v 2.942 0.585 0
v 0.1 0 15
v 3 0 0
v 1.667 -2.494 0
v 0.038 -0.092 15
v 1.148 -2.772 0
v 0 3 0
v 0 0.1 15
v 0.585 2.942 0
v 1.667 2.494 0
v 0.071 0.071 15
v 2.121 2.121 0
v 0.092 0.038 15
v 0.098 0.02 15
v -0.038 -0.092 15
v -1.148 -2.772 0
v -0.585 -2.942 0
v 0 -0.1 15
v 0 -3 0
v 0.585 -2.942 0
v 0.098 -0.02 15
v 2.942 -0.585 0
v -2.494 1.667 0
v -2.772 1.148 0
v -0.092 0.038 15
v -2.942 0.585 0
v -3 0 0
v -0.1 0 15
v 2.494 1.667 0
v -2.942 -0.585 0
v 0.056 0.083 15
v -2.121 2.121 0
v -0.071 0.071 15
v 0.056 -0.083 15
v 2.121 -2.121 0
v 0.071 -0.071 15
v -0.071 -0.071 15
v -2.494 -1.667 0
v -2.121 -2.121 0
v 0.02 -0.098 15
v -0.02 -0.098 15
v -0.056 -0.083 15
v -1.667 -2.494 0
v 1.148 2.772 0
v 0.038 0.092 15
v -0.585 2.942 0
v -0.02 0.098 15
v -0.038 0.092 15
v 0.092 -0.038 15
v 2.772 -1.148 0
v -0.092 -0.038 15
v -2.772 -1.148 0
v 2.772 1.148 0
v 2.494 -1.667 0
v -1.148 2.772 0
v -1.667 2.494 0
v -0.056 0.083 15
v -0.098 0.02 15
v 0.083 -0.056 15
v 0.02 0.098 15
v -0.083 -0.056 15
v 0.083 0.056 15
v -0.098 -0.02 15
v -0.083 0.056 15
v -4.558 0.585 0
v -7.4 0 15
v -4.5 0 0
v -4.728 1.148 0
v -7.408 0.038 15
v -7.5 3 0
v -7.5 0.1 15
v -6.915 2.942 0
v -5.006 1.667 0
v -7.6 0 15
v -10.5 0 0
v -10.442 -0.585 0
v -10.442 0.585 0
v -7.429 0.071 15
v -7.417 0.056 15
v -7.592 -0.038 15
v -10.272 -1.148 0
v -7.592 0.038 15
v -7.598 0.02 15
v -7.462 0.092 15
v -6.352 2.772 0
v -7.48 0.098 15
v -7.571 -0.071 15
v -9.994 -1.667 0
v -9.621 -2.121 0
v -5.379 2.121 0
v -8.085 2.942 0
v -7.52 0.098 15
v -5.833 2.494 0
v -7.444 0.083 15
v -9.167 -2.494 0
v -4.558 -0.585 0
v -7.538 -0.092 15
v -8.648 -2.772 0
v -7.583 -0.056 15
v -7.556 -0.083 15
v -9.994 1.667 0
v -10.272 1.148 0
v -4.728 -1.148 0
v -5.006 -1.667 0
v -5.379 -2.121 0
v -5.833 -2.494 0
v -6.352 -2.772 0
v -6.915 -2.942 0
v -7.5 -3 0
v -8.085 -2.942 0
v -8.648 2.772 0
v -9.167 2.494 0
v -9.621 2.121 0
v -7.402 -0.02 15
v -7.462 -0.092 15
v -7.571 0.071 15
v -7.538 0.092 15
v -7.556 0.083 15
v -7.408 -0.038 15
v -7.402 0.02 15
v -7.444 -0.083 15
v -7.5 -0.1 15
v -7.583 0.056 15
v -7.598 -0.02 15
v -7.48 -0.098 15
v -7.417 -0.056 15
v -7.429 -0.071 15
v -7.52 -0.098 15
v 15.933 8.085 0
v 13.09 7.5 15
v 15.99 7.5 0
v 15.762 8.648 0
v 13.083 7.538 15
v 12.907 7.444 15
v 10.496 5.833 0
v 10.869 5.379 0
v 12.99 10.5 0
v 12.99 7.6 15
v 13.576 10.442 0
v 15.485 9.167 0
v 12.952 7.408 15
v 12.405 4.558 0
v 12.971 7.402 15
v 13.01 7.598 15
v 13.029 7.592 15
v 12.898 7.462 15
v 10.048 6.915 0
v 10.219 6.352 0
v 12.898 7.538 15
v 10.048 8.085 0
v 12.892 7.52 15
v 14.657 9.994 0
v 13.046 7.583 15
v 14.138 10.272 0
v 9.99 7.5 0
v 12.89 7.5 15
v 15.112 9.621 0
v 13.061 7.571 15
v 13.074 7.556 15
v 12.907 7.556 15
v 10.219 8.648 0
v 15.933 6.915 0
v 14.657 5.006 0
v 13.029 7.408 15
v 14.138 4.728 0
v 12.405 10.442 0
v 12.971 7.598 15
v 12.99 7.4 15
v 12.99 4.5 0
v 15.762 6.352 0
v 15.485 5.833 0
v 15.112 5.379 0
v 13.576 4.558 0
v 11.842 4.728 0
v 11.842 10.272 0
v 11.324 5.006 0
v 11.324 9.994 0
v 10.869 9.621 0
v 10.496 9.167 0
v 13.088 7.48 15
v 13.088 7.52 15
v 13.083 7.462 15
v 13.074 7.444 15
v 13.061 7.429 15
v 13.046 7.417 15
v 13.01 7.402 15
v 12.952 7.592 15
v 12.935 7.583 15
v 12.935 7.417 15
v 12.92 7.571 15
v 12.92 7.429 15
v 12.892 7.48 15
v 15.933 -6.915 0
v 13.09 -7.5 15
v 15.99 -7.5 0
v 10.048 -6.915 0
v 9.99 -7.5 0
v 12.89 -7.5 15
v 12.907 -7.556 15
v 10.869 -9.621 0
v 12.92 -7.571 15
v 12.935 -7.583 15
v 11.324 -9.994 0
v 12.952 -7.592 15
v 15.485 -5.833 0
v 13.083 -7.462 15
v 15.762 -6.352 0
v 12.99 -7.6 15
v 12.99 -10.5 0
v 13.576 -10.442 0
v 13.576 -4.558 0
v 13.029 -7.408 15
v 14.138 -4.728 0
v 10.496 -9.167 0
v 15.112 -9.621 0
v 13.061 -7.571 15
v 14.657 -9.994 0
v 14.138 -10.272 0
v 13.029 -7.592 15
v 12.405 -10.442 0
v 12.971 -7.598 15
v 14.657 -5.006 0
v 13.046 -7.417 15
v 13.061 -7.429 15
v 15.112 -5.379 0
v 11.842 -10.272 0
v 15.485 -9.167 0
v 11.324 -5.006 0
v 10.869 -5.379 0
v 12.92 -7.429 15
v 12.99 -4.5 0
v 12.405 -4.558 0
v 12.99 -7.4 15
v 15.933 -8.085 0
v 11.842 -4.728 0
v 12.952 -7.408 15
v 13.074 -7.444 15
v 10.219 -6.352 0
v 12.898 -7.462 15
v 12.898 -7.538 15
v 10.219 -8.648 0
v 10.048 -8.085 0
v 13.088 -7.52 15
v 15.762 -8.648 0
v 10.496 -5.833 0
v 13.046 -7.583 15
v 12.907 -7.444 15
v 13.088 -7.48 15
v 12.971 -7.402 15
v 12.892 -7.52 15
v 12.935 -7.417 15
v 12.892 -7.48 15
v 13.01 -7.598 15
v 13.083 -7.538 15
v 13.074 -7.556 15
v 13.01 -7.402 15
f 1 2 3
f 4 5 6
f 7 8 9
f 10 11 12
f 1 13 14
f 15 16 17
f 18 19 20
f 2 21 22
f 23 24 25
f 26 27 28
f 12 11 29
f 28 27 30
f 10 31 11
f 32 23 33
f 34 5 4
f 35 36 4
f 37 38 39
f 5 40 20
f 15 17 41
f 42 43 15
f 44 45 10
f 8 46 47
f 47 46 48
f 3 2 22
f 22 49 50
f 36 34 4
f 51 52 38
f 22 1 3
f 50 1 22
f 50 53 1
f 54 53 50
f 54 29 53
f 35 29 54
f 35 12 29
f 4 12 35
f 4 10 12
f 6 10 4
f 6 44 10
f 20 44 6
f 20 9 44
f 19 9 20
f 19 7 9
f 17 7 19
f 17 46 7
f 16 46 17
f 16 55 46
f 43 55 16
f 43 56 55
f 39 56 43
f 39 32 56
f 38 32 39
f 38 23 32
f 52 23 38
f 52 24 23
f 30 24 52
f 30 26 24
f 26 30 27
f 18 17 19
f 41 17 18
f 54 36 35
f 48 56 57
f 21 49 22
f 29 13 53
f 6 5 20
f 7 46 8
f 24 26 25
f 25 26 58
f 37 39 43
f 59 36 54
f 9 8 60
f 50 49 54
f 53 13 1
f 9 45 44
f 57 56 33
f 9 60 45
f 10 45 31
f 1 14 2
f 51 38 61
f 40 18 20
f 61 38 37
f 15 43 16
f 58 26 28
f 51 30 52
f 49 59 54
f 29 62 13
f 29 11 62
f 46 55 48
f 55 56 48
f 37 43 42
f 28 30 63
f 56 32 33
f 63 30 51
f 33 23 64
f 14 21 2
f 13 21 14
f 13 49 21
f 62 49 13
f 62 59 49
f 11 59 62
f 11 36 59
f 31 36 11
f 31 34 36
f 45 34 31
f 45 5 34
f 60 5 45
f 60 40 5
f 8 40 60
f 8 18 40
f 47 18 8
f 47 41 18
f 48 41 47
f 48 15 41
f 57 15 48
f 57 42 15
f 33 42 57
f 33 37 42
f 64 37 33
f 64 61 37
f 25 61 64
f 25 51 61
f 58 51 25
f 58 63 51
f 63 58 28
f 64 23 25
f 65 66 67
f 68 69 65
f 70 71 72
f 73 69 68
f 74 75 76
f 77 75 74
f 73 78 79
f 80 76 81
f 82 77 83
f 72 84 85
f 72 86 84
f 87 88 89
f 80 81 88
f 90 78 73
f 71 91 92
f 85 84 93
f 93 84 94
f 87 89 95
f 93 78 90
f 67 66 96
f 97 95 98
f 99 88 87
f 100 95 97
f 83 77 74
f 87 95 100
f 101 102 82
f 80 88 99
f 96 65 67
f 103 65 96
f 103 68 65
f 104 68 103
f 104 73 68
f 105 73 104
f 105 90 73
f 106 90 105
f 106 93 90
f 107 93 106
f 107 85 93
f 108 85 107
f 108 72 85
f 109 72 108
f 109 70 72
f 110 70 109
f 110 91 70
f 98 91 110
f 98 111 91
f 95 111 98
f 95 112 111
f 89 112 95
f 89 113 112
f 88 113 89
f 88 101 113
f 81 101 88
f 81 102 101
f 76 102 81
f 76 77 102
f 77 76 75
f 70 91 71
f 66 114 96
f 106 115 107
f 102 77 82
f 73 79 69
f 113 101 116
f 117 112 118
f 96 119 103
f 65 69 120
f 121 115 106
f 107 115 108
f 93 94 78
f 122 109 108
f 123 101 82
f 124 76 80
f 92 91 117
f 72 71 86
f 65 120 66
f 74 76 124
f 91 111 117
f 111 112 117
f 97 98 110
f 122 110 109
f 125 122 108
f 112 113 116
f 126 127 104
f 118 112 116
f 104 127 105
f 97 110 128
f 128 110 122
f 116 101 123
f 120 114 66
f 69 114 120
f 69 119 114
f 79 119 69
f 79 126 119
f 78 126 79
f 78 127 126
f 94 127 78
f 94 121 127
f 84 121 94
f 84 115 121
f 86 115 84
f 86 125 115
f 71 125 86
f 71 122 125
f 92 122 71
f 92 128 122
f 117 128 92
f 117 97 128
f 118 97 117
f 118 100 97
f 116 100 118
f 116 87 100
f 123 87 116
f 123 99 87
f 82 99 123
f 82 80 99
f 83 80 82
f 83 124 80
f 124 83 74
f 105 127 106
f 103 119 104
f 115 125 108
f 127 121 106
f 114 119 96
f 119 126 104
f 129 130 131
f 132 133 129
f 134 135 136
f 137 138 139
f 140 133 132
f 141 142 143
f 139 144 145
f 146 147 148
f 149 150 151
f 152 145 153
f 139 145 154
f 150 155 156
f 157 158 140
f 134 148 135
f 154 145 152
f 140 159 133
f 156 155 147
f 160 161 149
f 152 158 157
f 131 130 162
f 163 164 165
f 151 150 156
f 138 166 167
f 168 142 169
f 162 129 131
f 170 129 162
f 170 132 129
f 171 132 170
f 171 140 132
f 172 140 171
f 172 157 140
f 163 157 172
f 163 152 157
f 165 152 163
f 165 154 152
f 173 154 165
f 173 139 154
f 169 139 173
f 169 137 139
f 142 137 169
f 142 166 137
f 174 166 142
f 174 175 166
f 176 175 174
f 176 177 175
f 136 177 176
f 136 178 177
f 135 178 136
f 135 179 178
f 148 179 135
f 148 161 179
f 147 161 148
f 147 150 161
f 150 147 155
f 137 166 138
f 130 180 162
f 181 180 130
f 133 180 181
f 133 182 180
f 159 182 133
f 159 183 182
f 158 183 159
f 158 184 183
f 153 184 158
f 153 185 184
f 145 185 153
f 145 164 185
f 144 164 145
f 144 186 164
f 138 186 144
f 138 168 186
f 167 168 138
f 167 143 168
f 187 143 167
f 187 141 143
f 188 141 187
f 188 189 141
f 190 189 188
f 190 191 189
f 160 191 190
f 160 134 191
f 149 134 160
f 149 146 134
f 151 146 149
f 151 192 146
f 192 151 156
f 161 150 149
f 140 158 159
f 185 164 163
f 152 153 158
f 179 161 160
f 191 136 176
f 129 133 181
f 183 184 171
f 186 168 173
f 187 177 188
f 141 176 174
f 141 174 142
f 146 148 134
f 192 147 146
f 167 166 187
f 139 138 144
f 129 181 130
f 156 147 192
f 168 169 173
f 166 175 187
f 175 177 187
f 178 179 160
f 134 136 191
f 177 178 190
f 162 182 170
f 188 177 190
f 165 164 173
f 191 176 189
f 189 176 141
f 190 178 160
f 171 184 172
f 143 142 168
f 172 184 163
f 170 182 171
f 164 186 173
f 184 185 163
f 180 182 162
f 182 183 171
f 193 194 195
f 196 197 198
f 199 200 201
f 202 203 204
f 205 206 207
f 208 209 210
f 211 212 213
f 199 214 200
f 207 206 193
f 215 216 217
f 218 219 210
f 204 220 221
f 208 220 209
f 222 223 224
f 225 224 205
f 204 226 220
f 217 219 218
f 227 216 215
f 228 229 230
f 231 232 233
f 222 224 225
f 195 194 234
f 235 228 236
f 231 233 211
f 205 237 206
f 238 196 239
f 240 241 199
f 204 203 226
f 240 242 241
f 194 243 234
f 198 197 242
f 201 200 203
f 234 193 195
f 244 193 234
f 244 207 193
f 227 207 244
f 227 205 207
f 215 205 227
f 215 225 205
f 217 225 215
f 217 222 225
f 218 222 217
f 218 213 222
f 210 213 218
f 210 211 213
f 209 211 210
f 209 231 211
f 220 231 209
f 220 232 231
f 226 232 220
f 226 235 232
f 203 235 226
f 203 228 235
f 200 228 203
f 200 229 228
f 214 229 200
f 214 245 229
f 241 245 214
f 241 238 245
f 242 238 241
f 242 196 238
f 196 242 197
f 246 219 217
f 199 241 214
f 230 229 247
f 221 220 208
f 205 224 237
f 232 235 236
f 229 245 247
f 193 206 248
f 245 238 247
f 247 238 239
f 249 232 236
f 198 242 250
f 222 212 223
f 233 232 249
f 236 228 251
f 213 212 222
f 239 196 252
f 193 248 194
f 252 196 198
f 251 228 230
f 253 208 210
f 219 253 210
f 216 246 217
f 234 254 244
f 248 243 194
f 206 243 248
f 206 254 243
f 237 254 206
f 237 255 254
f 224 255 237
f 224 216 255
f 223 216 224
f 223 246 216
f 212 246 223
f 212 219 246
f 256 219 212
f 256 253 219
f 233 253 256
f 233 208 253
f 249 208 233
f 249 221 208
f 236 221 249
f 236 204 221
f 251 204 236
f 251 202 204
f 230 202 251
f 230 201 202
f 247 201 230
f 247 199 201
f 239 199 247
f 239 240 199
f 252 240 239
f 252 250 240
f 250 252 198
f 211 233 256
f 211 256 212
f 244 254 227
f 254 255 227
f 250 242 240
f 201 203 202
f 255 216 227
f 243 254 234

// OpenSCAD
cylinder(15, 3, 0.1, $fn = 32);
translate([-7.5, 0, 0]) cylinder(15, 3, 0.1, $fn = 32);
translate([cos(30) * 15, sin(30) * 15, 0]) cylinder(15, 3, 0.1, $fn = 32);
translate([cos(30) * 15, sin(30) * -15, 0]) cylinder(15, 3, 0.1, $fn = 32);
